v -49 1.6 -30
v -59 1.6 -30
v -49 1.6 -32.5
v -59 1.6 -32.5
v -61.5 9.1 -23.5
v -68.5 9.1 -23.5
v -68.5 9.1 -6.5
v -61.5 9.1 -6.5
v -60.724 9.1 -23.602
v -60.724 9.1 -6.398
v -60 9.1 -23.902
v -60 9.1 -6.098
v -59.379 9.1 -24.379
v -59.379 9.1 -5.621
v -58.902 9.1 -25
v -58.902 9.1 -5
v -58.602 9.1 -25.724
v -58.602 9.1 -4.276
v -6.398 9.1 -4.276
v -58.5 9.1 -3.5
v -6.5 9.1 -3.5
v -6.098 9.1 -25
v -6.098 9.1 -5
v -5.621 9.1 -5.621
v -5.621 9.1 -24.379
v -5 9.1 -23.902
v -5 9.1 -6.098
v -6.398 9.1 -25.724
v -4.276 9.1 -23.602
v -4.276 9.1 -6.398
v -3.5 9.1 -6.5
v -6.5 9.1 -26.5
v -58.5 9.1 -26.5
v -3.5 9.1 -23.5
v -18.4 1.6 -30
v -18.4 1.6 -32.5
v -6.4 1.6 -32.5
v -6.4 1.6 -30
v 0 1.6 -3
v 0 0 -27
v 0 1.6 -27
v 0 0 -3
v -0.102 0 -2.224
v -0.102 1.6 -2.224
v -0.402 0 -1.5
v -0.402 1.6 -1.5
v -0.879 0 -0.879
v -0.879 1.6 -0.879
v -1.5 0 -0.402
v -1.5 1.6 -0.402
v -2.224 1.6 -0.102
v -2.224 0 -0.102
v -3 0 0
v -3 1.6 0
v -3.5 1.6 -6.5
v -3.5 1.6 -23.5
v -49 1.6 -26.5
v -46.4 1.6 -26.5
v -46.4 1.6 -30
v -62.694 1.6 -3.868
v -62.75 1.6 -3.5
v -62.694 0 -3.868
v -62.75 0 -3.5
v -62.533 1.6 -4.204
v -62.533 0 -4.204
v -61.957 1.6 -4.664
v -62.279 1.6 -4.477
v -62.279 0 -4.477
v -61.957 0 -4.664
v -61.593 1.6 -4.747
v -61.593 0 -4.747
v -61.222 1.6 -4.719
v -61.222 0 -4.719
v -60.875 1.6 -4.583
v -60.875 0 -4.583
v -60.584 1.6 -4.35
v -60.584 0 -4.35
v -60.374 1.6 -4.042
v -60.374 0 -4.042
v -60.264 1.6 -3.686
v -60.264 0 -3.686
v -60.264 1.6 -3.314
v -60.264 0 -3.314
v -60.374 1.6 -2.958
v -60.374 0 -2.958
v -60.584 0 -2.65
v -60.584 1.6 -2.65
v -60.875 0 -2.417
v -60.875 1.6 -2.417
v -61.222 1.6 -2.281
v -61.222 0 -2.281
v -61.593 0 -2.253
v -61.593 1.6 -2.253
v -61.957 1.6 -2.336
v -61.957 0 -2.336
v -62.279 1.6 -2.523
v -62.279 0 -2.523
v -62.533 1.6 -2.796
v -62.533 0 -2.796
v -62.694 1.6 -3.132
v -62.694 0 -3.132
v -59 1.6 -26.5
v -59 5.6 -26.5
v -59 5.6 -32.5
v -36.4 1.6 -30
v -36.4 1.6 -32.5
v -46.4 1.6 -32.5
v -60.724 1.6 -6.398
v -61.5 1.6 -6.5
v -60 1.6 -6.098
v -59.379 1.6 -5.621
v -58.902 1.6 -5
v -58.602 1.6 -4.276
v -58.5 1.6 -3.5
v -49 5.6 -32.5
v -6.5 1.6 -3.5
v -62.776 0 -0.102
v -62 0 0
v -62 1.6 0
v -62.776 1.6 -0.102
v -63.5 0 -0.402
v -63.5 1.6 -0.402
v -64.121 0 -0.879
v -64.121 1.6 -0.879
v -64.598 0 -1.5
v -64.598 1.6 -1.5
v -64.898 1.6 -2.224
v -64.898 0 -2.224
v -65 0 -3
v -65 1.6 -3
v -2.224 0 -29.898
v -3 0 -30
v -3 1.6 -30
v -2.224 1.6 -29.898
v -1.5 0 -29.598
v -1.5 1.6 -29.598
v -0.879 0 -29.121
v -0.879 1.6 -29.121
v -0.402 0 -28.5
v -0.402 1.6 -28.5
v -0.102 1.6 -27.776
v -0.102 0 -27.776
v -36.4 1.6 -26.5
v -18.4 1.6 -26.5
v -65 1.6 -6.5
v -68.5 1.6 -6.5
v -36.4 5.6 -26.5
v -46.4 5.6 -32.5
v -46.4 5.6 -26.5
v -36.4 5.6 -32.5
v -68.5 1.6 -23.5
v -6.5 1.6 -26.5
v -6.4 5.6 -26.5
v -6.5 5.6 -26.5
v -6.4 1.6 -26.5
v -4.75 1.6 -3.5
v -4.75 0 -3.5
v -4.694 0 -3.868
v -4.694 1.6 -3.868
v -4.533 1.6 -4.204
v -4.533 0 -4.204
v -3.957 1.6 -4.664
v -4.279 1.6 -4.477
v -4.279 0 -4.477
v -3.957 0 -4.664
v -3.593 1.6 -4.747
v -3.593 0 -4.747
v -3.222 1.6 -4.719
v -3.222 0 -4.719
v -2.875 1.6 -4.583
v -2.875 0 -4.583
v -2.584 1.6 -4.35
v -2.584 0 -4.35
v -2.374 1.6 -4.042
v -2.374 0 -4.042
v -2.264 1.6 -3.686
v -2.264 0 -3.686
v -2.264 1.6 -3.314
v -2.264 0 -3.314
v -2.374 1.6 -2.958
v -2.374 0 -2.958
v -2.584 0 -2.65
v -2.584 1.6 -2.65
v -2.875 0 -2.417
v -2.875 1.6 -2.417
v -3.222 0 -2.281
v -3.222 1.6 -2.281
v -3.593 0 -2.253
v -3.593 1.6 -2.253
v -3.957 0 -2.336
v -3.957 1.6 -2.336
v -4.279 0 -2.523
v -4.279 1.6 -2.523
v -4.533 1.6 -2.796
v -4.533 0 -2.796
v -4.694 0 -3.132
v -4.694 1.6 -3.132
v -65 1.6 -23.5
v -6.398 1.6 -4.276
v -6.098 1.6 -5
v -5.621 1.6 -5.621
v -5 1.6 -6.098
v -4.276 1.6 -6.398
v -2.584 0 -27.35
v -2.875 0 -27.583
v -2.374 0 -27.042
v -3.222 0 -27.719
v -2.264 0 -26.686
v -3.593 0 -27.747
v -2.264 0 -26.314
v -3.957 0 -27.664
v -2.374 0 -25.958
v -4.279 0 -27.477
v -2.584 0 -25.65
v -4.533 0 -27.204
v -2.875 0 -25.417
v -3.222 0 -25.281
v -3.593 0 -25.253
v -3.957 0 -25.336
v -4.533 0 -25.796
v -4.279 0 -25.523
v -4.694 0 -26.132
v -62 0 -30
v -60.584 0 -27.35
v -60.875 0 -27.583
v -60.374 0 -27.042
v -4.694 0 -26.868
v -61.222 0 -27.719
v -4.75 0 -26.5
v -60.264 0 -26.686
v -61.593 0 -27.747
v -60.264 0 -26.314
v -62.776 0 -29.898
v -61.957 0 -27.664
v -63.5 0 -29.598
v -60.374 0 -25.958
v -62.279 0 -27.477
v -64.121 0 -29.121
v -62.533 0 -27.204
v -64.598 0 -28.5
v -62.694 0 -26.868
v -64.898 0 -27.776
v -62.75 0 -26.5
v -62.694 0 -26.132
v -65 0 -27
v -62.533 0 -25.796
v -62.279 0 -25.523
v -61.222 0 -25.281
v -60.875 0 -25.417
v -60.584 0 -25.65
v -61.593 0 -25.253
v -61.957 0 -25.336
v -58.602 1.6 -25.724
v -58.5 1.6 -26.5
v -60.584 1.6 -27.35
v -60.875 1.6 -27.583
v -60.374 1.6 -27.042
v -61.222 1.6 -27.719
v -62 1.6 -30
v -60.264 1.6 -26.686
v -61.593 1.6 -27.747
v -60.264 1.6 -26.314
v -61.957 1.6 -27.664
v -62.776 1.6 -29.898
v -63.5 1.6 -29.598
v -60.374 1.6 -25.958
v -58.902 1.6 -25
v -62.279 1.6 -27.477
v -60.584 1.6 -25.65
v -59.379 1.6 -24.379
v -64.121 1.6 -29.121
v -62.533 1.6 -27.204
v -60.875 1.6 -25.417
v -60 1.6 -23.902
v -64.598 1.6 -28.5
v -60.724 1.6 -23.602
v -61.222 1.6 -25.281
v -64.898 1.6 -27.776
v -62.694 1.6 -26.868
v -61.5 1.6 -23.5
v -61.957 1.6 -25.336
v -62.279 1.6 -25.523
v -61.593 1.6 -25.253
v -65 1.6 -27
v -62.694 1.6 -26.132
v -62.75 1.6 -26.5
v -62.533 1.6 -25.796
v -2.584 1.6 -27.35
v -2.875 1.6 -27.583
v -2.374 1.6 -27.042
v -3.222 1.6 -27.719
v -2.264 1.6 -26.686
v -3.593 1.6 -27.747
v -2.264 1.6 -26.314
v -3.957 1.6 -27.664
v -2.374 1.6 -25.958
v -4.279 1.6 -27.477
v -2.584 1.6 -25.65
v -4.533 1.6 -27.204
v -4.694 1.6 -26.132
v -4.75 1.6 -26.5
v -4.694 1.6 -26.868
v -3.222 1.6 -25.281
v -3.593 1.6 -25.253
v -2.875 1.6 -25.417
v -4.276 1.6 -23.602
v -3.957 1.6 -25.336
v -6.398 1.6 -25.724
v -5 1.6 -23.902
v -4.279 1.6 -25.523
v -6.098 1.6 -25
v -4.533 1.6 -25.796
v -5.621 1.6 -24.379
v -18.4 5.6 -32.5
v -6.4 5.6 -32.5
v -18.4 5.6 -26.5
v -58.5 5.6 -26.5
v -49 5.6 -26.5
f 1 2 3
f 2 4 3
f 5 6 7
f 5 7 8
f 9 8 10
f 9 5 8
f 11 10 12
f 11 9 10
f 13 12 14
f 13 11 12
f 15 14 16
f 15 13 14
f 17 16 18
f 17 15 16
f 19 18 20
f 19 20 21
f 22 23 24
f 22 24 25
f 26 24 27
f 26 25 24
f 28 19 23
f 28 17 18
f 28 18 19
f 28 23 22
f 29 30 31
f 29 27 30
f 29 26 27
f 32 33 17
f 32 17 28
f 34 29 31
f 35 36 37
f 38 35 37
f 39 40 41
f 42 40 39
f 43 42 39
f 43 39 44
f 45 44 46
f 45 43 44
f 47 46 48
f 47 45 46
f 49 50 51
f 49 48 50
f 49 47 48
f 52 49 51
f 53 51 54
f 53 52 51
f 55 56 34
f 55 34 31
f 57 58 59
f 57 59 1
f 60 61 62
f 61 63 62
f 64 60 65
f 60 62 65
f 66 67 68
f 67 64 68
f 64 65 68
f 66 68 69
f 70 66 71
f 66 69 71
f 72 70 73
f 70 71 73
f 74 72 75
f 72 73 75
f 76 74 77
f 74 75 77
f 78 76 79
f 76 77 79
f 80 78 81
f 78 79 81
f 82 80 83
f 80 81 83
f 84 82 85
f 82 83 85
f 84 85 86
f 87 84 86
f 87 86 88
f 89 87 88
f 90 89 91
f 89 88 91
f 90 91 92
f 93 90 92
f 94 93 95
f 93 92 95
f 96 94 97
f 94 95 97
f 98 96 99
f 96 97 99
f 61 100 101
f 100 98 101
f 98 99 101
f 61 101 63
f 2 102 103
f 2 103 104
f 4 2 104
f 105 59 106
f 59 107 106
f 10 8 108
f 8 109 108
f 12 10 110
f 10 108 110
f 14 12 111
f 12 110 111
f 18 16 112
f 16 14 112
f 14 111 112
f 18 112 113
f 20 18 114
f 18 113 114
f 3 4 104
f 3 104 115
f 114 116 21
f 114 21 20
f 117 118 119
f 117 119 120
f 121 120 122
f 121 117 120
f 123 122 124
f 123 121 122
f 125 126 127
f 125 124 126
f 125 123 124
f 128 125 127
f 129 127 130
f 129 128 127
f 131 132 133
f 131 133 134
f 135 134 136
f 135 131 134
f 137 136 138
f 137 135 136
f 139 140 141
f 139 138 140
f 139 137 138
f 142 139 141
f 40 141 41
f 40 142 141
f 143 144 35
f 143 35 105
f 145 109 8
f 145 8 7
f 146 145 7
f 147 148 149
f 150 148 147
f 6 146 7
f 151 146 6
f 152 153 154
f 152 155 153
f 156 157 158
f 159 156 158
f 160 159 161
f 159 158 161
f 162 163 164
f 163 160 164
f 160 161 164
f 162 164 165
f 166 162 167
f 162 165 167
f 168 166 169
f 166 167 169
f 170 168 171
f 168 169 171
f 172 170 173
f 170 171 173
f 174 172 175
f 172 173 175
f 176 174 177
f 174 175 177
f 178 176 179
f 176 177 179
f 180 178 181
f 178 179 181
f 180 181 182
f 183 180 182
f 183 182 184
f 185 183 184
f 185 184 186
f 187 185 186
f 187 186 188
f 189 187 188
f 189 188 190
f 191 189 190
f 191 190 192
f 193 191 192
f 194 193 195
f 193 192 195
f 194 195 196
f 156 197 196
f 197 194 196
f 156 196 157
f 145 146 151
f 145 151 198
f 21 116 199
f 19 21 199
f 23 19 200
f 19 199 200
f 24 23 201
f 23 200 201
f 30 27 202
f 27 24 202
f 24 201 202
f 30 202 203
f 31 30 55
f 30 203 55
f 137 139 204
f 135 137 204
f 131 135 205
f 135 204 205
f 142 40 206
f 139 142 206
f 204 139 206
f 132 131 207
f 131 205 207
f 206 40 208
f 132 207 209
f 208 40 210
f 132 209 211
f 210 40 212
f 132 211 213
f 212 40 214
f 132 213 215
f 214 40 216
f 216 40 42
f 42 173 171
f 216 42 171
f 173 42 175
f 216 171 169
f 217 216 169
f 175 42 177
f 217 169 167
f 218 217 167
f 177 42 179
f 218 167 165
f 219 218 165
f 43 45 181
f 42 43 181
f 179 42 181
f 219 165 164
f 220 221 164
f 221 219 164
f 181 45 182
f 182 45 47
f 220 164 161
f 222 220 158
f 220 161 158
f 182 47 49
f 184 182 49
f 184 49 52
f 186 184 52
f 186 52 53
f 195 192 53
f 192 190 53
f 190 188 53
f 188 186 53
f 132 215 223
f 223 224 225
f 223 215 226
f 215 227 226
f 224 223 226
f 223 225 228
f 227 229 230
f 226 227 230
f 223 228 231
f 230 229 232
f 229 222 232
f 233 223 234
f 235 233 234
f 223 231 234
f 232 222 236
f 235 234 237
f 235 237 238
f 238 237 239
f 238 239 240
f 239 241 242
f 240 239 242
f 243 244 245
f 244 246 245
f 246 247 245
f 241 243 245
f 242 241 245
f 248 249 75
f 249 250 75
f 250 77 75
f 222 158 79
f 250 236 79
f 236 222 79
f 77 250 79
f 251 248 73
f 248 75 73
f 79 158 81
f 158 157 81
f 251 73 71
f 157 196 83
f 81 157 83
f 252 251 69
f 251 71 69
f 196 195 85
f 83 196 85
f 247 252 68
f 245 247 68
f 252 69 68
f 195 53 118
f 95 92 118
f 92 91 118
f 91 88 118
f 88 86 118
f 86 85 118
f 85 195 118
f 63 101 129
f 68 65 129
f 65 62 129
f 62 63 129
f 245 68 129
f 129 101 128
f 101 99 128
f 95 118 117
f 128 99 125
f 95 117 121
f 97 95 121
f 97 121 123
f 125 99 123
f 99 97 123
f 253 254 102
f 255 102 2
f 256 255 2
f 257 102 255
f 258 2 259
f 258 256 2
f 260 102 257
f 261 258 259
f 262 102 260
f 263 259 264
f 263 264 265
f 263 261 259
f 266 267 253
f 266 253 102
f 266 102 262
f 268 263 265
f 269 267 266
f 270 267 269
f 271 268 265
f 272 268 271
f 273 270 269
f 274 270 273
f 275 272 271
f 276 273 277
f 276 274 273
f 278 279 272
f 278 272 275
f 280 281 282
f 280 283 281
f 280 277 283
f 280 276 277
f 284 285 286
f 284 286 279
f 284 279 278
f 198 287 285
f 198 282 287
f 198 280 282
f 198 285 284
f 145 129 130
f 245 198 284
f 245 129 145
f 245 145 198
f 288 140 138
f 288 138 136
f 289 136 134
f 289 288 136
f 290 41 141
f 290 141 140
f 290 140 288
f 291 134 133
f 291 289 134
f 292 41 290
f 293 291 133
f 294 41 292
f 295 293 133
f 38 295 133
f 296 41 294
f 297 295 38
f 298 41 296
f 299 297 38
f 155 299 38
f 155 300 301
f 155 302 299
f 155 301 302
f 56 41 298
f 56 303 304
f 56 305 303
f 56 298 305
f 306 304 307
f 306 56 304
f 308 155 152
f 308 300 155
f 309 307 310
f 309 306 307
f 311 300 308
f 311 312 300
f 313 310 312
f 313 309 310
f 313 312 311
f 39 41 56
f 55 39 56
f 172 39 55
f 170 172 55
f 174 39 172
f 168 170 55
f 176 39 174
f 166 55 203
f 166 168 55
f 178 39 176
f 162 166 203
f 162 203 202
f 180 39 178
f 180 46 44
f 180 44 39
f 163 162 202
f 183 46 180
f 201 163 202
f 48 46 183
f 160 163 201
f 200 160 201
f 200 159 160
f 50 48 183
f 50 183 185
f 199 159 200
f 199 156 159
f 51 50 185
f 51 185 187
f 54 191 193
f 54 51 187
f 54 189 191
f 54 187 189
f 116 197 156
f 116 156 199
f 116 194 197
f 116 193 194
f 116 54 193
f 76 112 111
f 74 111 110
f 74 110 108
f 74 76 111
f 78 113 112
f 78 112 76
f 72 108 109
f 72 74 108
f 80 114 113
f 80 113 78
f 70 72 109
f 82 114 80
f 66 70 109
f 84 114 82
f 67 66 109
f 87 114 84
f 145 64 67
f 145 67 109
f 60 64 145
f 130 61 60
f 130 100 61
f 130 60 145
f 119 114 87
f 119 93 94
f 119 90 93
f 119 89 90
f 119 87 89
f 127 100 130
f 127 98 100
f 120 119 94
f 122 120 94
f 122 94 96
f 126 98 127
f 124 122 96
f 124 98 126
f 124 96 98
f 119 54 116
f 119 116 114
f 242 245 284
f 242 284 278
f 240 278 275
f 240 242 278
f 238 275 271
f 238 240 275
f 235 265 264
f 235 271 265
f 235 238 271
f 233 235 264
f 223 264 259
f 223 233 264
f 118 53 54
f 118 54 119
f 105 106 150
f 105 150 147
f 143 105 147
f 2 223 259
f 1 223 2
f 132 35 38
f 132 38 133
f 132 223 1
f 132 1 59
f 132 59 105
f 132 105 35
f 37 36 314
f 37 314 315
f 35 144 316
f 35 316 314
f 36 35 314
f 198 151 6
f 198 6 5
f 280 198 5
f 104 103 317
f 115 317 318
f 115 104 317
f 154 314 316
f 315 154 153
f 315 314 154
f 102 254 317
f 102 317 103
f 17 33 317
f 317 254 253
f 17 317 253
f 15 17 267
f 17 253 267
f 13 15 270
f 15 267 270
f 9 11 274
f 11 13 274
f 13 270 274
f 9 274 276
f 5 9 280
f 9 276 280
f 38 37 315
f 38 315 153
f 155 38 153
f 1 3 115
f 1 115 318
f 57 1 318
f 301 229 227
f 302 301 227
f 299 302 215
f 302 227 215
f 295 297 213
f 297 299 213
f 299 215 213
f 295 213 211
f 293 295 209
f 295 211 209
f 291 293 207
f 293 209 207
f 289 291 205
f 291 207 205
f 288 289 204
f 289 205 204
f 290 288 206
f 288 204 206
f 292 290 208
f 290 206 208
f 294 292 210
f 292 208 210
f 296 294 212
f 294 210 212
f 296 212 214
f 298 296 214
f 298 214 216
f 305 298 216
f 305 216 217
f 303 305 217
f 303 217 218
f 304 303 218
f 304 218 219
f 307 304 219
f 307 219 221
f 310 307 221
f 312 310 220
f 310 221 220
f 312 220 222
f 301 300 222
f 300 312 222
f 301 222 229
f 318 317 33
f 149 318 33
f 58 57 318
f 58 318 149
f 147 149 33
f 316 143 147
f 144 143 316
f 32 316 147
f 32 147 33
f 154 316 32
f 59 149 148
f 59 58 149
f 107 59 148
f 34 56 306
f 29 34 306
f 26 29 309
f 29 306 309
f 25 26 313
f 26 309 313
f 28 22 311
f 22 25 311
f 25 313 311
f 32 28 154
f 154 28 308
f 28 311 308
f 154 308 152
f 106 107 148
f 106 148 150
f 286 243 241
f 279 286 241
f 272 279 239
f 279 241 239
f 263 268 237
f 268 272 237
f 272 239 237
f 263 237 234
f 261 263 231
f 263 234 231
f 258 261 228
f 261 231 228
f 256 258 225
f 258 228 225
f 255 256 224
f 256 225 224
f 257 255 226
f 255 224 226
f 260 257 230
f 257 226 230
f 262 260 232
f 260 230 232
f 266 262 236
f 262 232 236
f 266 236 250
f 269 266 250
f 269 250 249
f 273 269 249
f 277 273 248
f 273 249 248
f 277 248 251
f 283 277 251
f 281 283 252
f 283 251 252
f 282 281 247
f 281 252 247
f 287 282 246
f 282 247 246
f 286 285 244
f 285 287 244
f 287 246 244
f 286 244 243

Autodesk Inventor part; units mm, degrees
ref_plane "YZ Plane" through (0, 0, 0) normal (1, 0, 0) x (0, 1, 0)
ref_plane "XZ Plane" through (0, 0, 0) normal (0, 1, 0) x (-1, 0, 0)
ref_plane "XY Plane" through (0, 0, 0) normal (0, 0, 1) x (1, 0, 0)
sketch "Sketch1" plane through (0, 0, 0) normal (0, 1, 0) x (-1, 0, 0)
  line L0 (3, 0) -> (62, 0)
  line L1 (65, -3) -> (65, -27)
  line L2 (62, -30) -> (3, -30)
  line L3 (0, -27) -> (0, -3)
  arc A0 (65, -3) -> (62, 0) centre (62, -3) ccw
  arc A1 (62, -30) -> (65, -27) centre (62, -27) ccw
  arc A2 (0, -27) -> (3, -30) centre (3, -27) ccw
  arc A3 (3, 0) -> (0, -3) centre (3, -3) ccw
  circle A4 centre (61.5, -26.5) radius 1.25
  circle A5 centre (61.5, -3.5) radius 1.25
  circle A6 centre (3.5, -26.5) radius 1.25
  circle A7 centre (3.5, -3.5) radius 1.25
  point P0 (0, 0)
  point P1 (65, -30)
  point P2 (65, 0)
  point P3 (0, -30)
  dimension "d0" = 65
  dimension "d1" = 30
  dimension "d2" = 3
  dimension "d3" = 2.5
  dimension "d4" = 3.5
  dimension "d5" = 3.5
  dimension "d8" = 23
  dimension "d11" = 58
extrude "Extrusion1" add sketch "Sketch1" along normal blind 1.6
sketch "Sketch2" plane through (0, 1.6, 0) normal (0, 1, 0) x (1, 0, 0)
  circle A0 centre (-61.5, 26.5) radius 1.25 projected
  line L0 (-65, 27) -> (-65, 3) construction
  line L1 (-65, 3) -> (-65, 27) construction
  line L2 (-3, 30) -> (-62, 30) construction
  line L3 (-62, 30) -> (-3, 30) construction
  circle A1 centre (-61.5, 26.5) radius 3 construction
  circle A2 centre (-61.5, 3.5) radius 3 construction
  circle A3 centre (-3.5, 26.5) radius 3 construction
  circle A4 centre (-3.5, 3.5) radius 3 construction
  circle A5 centre (-61.5, 3.5) radius 1.25 construction
  line L4 (-3.5, 3.5) -> (-61.5, 3.5) construction
  line L5 (-61.5, 3.5) -> (-61.5, 26.5) construction
  circle A6 centre (-3.5, 26.5) radius 1.25 construction
  line L6 (-61.5, 26.5) -> (-60.25, 26.5) construction
  circle A7 centre (-3.5, 3.5) radius 1.25 construction
  line L7 (-3.5, 26.5) -> (-3.5, 3.5) construction
  line L8 (-61.5, 3.5) -> (-61.5, 26.5) construction
  line L9 (-3.5, 26.5) -> (-61.5, 26.5) construction
  line L10 (-62, 0) -> (-3, 0) construction
  line L11 (-60.25, 26.5) -> (-3.5, 26.5) construction
  line L12 (-61.5, 6.5) -> (-61.5, 23.5)
  line L13 (-58.5, 26.5) -> (-6.5, 26.5)
  line L14 (-3.5, 23.5) -> (-3.5, 6.5)
  line L15 (-6.5, 3.5) -> (-58.5, 3.5)
  arc A8 (-61.5, 23.5) -> (-58.5, 26.5) centre (-61.5, 26.5) ccw
  arc A9 (-6.5, 26.5) -> (-3.5, 23.5) centre (-3.5, 26.5) ccw
  arc A10 (-3.5, 6.5) -> (-6.5, 3.5) centre (-3.5, 3.5) ccw
  arc A11 (-58.5, 3.5) -> (-61.5, 6.5) centre (-61.5, 3.5) ccw
  line L16 (-61.5, 6.5) -> (-68.5, 6.5)
  line L17 (-68.5, 6.5) -> (-68.5, 23.5)
  line L18 (-68.5, 23.5) -> (-61.5, 23.5)
  line L19 (-3.5, 6.5) -> (3.5, 6.5)
  line L20 (3.5, 6.5) -> (3.5, 23.5)
  line L21 (3.5, 23.5) -> (-3.5, 23.5)
  point P0 (0, 0)
  dimension "d17" = 6
  dimension "d20" = 23
  dimension "d23" = 58
  dimension "d28" = 7
  dimension "d29" = 7
extrude "Extrusion3" add sketch "Sketch2" along normal blind 7.5 contours L16 L17 L18 L12 | L12 A8 L13 A9 L14 A10 L15 A11
sketch "Sketch5" plane through (0, 1.6, 0) normal (0, 1, 0) x (1, 0, 0)
  line L0 (-6.5, 26.5) -> (-58.5, 26.5) projected
  line L1 (-36.4, 26.5) -> (-46.4, 26.5)
  line L2 (-46.4, 26.5) -> (-46.4, 32.5)
  line L3 (-46.4, 32.5) -> (-36.4, 32.5)
  line L4 (-36.4, 32.5) -> (-36.4, 26.5)
  line L5 (-41.4, 26.5) -> (-41.4, 32.5) construction
  line L6 (0, 3) -> (0, 27) construction
  line L7 (-49, 26.5) -> (-59, 26.5)
  line L8 (-59, 26.5) -> (-59, 32.5)
  line L9 (-59, 32.5) -> (-49, 32.5)
  line L10 (-49, 32.5) -> (-49, 26.5)
  line L11 (-54, 26.5) -> (-54, 32.5) construction
  line L12 (-58.5, 26.5) -> (-6.5, 26.5) projected
  line L13 (-6.4, 26.5) -> (-18.4, 26.5)
  line L14 (-18.4, 26.5) -> (-18.4, 32.5)
  line L15 (-18.4, 32.5) -> (-6.4, 32.5)
  line L16 (-6.4, 32.5) -> (-6.4, 26.5)
  line L17 (-12.4, 26.5) -> (-12.4, 32.5) construction
  point P0 (0, 0)
  dimension "d37" = 10
  dimension "d38" = 6
  dimension "d39" = 41.4
  dimension "d40" = 10
  dimension "d41" = 6
  dimension "d42" = 54
  dimension "d45" = 12
  dimension "d46" = 6
  dimension "d47" = 12.4
extrude "Extrusion5" add sketch "Sketch5" along normal blind 4
equation "\"d40\" = d37"
equation "\"d41\" = d38"
properties part number "RaspberryPi0W-SafeSpecs" material "ABS Plastic"
